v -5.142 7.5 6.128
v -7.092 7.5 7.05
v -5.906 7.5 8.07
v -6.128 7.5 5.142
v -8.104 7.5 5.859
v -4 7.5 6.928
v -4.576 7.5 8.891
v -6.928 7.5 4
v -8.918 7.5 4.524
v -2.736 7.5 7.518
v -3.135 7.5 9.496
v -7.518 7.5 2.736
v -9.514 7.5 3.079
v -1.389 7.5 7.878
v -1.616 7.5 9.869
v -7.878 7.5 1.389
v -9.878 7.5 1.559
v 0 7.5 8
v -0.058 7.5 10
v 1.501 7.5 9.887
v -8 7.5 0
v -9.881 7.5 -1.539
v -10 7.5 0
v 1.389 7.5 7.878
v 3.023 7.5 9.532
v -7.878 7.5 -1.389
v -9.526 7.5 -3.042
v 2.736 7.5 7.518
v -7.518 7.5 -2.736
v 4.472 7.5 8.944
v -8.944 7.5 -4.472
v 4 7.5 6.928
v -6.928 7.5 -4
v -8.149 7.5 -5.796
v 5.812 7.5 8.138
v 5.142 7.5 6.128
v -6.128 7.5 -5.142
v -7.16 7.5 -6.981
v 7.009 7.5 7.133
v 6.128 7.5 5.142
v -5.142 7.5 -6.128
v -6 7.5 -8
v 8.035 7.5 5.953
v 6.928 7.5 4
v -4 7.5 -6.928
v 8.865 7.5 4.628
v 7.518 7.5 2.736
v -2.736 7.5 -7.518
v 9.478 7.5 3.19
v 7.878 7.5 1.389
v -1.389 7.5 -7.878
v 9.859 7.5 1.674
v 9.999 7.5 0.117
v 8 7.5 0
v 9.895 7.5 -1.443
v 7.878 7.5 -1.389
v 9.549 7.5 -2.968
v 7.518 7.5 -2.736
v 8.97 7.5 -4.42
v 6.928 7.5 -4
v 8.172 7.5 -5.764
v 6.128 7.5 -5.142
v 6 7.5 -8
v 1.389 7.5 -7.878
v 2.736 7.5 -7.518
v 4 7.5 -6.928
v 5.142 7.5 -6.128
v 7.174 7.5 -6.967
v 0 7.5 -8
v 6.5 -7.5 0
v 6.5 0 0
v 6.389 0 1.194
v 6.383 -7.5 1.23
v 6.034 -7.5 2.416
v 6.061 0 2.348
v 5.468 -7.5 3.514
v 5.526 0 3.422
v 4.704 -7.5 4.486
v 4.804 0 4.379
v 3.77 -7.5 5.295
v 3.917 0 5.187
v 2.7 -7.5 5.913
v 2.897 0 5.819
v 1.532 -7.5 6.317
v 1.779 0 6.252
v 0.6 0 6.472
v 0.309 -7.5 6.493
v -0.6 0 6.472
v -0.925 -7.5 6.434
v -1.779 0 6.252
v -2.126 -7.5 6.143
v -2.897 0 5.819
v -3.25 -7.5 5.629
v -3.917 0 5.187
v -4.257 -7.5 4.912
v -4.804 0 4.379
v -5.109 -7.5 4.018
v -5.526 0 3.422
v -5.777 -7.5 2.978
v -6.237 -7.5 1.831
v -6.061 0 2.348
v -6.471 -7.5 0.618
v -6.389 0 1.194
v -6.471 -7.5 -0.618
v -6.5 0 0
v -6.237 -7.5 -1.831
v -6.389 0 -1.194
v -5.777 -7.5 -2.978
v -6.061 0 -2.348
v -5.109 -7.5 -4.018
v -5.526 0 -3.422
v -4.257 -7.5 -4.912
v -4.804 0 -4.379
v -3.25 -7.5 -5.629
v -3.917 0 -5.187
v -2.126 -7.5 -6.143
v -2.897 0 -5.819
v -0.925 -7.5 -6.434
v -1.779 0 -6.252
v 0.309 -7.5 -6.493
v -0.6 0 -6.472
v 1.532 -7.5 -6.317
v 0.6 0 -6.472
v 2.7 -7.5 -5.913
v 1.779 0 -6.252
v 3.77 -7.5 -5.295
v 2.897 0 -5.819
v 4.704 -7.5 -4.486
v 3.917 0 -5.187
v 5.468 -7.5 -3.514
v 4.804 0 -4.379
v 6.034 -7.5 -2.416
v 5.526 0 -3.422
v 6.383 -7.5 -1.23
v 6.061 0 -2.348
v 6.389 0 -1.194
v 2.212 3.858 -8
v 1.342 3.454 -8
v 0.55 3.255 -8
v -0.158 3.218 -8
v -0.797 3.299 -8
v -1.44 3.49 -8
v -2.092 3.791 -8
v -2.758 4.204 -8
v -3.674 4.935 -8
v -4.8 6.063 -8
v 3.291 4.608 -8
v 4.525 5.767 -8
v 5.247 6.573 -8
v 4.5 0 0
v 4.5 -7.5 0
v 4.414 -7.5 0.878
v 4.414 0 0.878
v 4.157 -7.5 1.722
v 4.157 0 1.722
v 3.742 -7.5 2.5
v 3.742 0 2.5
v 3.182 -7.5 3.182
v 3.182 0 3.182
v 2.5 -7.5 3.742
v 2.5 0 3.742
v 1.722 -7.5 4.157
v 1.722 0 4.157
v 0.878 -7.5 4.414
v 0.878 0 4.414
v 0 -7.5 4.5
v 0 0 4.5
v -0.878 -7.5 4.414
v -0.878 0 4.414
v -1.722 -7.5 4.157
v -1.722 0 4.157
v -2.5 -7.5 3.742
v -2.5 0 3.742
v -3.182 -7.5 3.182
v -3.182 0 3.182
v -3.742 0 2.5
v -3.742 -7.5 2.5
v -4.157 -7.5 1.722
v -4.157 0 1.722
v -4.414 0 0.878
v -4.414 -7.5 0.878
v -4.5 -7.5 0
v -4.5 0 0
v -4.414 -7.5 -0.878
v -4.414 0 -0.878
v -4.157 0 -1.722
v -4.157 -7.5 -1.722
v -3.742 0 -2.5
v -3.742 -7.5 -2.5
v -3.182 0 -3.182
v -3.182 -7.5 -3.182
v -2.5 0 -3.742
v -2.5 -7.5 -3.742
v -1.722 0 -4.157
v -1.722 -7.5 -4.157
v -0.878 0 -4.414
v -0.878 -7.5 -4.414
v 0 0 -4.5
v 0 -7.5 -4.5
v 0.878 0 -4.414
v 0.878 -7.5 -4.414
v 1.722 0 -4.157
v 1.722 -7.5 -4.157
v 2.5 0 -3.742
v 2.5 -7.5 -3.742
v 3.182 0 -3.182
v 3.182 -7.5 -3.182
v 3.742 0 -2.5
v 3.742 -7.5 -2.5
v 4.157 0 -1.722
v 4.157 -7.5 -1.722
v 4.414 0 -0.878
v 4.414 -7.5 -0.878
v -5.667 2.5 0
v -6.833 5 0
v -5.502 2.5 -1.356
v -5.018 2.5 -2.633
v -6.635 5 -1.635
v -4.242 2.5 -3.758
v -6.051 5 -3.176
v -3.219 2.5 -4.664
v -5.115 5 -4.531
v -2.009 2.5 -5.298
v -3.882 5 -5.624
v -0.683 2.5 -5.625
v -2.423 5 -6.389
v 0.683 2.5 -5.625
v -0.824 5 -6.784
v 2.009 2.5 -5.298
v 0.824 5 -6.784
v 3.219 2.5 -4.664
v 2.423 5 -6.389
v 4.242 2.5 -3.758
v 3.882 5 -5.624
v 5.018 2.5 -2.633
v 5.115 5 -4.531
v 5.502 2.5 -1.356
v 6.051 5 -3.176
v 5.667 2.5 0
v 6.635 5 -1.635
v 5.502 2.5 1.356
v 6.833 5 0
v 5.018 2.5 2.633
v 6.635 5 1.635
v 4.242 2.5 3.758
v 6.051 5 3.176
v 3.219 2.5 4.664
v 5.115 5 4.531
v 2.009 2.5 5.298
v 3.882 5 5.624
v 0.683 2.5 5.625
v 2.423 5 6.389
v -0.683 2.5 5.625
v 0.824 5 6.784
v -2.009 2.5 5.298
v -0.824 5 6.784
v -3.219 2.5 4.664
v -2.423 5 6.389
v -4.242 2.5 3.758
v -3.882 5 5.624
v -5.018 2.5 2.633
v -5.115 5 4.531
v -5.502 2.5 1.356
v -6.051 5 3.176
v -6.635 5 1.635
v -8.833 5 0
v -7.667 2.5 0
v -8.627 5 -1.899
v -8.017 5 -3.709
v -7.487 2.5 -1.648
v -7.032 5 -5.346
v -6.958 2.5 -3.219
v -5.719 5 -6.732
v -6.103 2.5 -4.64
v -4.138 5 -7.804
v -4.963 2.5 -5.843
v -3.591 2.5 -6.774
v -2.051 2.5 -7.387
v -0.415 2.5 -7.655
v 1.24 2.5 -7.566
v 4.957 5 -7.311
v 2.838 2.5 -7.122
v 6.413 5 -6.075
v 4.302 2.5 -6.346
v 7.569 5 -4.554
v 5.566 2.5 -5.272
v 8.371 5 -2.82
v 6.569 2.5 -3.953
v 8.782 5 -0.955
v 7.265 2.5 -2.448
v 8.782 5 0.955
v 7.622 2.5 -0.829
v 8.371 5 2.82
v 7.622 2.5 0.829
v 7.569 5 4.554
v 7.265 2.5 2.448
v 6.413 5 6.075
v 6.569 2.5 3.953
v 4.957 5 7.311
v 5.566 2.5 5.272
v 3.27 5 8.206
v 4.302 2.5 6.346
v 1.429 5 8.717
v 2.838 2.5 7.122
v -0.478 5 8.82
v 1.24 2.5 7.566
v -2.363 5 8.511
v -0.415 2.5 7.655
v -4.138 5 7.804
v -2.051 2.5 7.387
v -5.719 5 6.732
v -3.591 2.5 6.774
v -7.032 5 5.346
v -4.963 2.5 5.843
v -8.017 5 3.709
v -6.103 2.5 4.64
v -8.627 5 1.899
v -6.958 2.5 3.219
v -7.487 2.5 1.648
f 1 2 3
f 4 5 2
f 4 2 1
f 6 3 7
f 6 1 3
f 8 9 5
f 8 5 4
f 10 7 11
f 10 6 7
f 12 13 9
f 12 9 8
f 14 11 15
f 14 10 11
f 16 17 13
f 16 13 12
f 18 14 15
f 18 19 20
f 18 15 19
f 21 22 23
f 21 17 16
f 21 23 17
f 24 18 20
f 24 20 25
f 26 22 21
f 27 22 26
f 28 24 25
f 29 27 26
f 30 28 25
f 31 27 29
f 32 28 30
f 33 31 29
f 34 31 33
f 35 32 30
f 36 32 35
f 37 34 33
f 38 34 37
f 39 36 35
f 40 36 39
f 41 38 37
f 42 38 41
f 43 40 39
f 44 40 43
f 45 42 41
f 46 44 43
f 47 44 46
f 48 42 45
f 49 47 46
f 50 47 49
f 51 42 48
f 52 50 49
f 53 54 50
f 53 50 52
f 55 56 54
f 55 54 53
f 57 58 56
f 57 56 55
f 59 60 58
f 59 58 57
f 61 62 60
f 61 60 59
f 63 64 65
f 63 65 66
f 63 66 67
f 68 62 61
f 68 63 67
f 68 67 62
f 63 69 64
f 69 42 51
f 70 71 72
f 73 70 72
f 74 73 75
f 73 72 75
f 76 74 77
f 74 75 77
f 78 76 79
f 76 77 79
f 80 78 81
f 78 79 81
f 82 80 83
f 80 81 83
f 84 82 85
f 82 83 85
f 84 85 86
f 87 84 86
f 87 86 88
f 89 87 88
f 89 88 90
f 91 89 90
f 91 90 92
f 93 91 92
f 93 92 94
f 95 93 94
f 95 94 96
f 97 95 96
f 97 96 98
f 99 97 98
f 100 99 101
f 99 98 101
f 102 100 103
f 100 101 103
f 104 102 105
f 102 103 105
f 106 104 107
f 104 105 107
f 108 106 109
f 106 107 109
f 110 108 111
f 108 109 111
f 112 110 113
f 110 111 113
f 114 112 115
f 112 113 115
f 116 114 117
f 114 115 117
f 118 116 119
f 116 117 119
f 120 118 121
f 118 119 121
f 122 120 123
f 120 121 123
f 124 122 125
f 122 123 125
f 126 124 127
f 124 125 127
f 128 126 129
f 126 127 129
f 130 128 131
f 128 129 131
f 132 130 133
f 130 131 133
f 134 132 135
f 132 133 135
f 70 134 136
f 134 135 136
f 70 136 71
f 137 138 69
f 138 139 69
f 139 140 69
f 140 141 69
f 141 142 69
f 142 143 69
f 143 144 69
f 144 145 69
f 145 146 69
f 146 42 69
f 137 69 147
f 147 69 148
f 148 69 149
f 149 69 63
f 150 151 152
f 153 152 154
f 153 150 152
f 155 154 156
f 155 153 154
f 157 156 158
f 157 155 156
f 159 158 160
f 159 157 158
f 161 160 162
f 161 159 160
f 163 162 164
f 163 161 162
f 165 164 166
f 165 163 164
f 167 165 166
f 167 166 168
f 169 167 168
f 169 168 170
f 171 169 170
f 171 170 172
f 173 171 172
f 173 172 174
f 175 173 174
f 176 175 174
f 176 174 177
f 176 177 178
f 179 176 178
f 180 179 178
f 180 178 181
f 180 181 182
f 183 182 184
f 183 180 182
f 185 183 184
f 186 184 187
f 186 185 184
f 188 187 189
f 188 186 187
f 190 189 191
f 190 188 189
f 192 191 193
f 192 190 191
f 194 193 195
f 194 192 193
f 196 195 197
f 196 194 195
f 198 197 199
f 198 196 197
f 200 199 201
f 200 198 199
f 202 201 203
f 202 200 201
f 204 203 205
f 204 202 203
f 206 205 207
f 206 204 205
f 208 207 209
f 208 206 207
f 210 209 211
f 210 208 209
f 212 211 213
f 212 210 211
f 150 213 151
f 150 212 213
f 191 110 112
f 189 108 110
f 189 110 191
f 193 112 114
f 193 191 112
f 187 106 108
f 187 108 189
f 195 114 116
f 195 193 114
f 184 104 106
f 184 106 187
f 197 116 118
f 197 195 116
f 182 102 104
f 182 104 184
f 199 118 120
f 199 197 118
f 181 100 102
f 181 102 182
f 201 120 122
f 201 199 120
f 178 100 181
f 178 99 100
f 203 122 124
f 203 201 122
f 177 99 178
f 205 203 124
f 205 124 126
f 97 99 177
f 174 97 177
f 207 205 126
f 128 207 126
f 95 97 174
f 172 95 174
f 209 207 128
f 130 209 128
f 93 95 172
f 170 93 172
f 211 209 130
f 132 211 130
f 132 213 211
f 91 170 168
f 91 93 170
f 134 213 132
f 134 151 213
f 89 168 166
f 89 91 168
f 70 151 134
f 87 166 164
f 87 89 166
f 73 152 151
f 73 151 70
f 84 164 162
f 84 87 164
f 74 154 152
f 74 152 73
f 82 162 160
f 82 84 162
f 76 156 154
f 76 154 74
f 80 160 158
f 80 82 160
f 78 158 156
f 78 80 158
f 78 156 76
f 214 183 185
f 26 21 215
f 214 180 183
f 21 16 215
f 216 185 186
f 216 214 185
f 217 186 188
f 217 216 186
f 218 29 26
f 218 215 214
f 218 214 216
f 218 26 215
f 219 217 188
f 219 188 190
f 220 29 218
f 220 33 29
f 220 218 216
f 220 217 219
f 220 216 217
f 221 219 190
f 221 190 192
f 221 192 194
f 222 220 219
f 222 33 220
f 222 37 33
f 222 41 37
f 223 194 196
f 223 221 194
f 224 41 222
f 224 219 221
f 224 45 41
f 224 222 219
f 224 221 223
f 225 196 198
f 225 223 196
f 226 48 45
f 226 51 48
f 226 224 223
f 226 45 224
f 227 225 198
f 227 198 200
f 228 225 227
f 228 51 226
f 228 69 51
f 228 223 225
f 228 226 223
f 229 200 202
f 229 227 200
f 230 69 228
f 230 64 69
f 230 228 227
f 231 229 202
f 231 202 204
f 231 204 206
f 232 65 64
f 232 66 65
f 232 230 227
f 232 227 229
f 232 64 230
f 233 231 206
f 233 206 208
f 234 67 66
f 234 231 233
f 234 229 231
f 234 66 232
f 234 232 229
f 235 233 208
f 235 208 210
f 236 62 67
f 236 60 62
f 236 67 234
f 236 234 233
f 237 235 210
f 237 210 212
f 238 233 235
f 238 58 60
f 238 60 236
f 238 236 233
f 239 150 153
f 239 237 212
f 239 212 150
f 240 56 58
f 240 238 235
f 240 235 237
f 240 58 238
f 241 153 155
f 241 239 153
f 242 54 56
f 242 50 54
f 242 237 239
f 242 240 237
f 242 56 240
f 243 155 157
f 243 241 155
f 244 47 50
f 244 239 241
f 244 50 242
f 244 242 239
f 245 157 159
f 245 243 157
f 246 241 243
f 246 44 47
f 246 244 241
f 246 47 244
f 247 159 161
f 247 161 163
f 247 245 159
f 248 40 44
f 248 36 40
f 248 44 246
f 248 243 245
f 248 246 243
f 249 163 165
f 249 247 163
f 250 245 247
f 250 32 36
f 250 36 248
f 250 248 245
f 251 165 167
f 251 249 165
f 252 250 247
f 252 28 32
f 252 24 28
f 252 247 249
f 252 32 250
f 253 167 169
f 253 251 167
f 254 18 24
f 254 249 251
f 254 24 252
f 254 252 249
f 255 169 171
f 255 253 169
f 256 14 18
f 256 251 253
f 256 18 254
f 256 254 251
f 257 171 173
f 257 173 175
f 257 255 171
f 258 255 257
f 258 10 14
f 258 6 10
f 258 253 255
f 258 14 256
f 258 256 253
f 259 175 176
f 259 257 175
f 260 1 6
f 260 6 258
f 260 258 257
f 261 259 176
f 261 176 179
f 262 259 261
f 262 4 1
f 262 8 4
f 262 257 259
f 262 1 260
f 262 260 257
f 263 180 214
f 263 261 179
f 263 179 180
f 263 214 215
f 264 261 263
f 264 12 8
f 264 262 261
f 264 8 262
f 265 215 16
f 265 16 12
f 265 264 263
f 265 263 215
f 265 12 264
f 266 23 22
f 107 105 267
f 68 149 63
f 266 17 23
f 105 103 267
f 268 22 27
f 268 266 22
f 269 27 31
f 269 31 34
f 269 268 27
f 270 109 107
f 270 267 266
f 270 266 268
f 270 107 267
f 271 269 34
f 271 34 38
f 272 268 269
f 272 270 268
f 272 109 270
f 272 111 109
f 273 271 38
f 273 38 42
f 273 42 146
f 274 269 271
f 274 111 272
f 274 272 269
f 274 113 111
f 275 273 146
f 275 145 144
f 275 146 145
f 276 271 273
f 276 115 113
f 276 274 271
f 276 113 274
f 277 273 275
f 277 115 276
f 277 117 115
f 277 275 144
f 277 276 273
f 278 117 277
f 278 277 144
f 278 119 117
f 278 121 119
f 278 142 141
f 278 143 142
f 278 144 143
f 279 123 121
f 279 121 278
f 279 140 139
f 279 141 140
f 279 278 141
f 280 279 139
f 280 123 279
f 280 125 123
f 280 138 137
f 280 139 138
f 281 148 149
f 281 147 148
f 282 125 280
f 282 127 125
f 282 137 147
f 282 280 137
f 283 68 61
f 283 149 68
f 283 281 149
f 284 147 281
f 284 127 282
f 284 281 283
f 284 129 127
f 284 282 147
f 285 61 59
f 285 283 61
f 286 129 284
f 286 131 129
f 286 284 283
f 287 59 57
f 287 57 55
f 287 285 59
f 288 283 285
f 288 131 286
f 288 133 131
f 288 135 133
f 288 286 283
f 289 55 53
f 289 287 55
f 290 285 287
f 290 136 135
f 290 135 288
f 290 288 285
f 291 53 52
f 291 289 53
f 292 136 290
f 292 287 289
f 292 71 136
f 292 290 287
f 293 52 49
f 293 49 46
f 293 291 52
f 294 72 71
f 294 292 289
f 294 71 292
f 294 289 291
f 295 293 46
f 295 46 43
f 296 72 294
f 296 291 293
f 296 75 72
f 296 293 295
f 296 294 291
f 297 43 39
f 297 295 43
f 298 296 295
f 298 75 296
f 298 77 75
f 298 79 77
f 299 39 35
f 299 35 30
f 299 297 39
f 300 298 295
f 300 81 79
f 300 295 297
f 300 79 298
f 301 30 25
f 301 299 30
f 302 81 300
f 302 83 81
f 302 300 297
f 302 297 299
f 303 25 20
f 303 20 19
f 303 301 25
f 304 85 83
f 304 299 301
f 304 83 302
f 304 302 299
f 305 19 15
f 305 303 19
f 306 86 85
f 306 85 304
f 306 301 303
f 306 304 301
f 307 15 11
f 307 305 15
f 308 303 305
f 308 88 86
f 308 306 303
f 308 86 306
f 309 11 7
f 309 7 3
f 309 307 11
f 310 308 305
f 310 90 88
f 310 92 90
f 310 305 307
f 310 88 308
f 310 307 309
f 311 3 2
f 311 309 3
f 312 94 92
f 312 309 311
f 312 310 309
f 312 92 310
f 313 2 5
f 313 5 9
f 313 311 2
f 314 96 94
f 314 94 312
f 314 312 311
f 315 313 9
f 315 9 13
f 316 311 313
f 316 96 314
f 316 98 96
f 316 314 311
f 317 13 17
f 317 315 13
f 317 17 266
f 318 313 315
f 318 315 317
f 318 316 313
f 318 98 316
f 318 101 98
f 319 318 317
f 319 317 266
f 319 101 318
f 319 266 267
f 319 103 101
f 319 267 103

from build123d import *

# Parameters (mm, degrees)
CROQUIS3_R              = 6.5
CROQUIS3_R_2            = 4.5
SALIENTE_EXTRUIR1_DEPTH = 7.5
CORTAR_EXTRUIR1_DEPTH   = 7.5


with BuildPart() as part:
    # Croquis2 → Revolución1 (revolve)
    with BuildSketch(Plane.XY):
        Polygon((-4.5, 0), (-8, 7.5), (-10, 7.5), (-6.5, 0), align=None)
    revolve(axis=Axis((0, 7.5, 0), (0, -1, 0)))

    # Croquis3 → Saliente-Extruir1 (add)
    with BuildSketch(Plane.XZ):
        Circle(CROQUIS3_R)
        Circle(CROQUIS3_R_2, mode=Mode.SUBTRACT)
    extrude(amount=SALIENTE_EXTRUIR1_DEPTH)

    # Croquis4 → Cortar-Extruir1 (cut)
    with BuildSketch(Plane(origin=(0, 7.5, 0), x_dir=(1, 0, 0), z_dir=(0, 1, 0))):
        Polygon((-9.027753826, 8), (9.027753826, 8), (9.027753826, 15.356589522), (-9.467057566, 15.356589522), align=None)
    extrude(amount=-CORTAR_EXTRUIR1_DEPTH, mode=Mode.SUBTRACT)


solid = part.part
